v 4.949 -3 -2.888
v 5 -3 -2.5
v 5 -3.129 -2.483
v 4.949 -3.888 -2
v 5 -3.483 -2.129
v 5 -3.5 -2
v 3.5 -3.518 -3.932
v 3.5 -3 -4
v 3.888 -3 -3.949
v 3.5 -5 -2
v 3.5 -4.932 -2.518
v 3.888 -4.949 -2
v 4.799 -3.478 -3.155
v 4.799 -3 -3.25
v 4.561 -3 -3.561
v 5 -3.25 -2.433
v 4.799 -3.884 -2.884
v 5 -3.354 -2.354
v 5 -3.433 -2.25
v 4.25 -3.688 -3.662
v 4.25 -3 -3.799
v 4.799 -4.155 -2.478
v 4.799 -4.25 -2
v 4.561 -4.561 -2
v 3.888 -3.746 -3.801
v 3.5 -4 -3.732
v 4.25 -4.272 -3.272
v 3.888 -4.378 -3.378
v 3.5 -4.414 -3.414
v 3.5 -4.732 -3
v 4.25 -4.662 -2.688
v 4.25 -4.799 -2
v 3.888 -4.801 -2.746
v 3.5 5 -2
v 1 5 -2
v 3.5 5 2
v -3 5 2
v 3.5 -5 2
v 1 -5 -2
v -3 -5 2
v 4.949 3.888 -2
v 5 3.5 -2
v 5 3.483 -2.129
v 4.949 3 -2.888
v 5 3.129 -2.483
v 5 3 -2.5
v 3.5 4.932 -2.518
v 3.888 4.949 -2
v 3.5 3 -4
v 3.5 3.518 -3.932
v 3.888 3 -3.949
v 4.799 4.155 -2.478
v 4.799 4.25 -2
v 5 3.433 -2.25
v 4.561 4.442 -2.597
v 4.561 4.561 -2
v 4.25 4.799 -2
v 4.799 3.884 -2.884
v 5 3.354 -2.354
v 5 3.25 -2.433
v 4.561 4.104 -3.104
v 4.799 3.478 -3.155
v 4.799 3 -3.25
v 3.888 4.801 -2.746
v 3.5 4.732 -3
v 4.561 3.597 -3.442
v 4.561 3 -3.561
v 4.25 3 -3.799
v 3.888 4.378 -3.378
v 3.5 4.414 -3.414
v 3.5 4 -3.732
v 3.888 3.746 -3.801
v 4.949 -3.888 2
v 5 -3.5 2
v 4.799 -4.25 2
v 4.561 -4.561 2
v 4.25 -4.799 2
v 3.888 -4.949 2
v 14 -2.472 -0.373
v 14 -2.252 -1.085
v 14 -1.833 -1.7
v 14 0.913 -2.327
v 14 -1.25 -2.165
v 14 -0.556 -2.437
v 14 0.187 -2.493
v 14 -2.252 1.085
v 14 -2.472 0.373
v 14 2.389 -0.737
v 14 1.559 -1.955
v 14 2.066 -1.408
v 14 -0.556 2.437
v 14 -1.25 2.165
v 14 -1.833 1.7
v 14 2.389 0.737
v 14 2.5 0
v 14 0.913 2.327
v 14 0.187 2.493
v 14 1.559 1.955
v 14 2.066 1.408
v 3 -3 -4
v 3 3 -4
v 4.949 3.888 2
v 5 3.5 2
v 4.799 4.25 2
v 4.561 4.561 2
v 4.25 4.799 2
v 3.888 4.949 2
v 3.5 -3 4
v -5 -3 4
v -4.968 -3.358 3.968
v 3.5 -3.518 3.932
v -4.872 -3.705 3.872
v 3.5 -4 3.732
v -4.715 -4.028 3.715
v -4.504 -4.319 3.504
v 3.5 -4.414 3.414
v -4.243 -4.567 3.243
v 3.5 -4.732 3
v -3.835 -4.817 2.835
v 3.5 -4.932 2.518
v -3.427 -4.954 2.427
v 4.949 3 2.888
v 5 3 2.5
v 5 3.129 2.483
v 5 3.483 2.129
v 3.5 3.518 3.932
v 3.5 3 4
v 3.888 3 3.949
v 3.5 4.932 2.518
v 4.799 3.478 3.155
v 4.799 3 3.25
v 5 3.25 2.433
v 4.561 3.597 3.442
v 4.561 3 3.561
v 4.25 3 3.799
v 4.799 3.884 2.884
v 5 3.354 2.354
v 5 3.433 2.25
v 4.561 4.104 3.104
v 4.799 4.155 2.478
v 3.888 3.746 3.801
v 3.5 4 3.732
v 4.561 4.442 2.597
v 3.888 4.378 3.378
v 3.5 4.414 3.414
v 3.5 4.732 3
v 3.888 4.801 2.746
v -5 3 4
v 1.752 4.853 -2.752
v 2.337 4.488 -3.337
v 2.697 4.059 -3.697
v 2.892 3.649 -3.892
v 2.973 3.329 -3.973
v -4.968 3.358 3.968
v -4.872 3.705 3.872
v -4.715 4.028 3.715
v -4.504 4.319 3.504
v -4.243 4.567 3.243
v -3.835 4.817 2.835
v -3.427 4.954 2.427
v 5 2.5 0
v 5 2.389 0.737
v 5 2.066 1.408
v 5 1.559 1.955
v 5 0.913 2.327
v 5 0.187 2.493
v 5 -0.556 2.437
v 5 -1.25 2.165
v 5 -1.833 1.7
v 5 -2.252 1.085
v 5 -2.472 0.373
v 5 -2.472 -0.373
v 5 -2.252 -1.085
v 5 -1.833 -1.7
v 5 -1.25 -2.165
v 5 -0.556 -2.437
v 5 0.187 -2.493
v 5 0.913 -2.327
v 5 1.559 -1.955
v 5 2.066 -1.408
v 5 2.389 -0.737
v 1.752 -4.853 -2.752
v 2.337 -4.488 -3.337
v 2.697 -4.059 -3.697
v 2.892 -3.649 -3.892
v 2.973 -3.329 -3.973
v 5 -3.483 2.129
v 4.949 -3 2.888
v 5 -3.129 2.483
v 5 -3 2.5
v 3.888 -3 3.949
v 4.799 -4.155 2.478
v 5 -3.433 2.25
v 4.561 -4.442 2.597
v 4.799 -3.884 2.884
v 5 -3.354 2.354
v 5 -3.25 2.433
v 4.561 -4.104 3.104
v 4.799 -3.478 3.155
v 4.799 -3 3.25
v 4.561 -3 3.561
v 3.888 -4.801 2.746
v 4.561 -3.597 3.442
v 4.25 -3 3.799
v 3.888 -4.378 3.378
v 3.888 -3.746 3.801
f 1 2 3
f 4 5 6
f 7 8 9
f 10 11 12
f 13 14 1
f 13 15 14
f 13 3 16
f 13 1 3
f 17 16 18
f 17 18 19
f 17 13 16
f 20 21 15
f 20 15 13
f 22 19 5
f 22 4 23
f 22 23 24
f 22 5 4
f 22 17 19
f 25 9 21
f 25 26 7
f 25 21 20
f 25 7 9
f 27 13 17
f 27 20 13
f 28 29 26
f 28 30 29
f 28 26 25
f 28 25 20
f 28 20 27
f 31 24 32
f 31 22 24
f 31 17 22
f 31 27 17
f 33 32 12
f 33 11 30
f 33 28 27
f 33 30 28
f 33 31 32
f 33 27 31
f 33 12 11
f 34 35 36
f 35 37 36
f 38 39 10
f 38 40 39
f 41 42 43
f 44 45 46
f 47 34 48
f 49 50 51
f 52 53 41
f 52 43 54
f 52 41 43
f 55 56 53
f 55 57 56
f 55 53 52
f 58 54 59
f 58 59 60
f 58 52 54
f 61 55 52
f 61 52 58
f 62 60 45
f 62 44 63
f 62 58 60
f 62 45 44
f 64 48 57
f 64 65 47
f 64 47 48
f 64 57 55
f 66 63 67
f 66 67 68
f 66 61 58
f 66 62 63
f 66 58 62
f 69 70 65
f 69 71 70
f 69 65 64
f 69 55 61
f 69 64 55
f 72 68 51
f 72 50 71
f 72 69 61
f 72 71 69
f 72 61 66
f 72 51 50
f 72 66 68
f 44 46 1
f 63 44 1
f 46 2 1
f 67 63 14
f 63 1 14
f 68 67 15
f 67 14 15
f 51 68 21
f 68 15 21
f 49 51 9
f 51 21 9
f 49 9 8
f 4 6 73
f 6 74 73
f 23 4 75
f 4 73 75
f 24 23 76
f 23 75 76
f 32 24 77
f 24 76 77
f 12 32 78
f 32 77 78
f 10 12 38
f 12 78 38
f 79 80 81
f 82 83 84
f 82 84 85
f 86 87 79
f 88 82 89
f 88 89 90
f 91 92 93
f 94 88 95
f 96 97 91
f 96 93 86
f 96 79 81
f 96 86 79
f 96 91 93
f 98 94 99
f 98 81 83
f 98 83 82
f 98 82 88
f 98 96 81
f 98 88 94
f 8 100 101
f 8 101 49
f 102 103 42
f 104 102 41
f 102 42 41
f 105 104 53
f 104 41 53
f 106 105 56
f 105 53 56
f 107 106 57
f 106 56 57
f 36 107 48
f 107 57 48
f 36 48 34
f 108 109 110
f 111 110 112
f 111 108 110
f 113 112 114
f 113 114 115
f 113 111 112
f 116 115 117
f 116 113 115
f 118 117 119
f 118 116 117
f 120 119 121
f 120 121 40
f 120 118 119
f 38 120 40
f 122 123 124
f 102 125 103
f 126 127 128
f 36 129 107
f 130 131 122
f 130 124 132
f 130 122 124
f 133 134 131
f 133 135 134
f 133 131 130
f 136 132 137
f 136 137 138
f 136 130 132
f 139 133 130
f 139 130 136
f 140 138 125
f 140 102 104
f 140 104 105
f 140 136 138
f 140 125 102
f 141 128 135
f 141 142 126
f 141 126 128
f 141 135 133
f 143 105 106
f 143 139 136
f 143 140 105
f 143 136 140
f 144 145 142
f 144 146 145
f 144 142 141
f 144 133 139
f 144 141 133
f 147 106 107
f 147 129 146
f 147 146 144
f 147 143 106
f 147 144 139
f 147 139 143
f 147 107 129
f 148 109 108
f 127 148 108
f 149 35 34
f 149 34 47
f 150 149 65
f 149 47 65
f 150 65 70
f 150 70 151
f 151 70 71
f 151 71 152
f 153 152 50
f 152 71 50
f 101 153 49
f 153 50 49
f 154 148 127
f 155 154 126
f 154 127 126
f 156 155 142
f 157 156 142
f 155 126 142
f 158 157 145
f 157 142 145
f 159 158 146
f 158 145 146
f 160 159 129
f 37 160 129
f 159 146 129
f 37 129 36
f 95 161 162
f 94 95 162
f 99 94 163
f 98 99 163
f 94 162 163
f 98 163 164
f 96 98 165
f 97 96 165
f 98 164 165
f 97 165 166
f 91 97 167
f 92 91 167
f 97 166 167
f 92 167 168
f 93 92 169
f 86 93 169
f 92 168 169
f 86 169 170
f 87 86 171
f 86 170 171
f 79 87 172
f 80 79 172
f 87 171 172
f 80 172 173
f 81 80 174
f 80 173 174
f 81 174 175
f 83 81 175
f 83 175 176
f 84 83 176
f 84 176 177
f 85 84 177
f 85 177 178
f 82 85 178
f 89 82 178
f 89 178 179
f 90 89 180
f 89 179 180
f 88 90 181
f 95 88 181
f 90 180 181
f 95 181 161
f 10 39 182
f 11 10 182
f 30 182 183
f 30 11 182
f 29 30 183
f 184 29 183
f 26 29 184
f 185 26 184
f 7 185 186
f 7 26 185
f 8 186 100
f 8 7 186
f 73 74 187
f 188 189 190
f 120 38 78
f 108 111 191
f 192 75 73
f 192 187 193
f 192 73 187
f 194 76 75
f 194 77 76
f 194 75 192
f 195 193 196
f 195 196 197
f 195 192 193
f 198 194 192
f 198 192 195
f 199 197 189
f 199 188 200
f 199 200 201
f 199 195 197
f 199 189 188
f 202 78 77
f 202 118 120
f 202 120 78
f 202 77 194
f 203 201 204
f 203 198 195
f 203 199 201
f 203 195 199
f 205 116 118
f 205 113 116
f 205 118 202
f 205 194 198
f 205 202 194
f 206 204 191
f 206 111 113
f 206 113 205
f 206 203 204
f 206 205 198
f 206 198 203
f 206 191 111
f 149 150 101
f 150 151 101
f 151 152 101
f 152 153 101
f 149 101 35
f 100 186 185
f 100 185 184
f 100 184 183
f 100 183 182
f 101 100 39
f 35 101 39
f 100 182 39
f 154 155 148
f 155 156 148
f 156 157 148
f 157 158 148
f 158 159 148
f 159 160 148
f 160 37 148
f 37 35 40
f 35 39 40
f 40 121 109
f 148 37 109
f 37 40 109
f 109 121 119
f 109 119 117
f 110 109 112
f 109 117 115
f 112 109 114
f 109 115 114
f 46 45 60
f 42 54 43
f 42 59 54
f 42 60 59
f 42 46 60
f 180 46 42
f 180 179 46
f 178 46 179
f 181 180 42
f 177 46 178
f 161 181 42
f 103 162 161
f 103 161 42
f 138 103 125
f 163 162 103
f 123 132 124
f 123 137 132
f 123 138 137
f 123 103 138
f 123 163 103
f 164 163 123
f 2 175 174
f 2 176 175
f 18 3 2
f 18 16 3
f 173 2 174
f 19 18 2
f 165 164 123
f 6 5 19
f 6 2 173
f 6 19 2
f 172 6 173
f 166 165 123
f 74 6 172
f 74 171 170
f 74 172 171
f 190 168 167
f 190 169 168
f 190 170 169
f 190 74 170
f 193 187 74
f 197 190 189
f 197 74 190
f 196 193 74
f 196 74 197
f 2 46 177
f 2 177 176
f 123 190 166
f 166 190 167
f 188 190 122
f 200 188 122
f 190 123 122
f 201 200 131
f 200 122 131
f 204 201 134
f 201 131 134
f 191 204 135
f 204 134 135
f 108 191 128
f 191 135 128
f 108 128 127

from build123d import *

# Parameters (mm, degrees)
F0_W     = 10
F0_H     = 8
F1_DEPTH = 5
F3_DEPTH = 10.001
F4_R     = 2.5
F5_DEPTH = 9
F6_R     = 2
F7_R     = 1.49999


# Not quite as in the source:
# - a fillet or chamfer is up to 0.001 mm smaller than in the source, because OpenCascade refuses the exact size


with BuildPart() as f1:
    # F0 (on Front) → F1 (new body, symmetric)
    with BuildSketch(Plane.XZ):
        Rectangle(F0_W, F0_H)
    extrude(amount=F1_DEPTH, both=True)

    # F2 (on face) → F3 (cut, through all)
    with BuildSketch(Plane.XZ.offset(5)):
        Polygon((3, -4), (-5, 4), (-5, -4), align=None)
    extrude(amount=-F3_DEPTH, mode=Mode.SUBTRACT)

    # F4 (on face) → F5 (join)
    with BuildSketch(Plane.YZ.offset(5)):
        Circle(F4_R)
    extrude(amount=F5_DEPTH)

    # F6
    f6_edges = [f1.edges().sort_by_distance(p)[0] for p in [
        (0, -5, 4),
        (0, 5, 4),
        (4, -5, -4),
        (4, 5, -4),
    ]]
    fillet(f6_edges, radius=F6_R)

    # F7 (radius 1.5 in the source; OpenCascade refuses exactly that, so slightly less here)
    f7_edges = [f1.edges().sort_by_distance(p)[0] for p in [
        (5, -5, 0),
    ]]
    fillet(f7_edges, radius=F7_R)


solid = f1.part
